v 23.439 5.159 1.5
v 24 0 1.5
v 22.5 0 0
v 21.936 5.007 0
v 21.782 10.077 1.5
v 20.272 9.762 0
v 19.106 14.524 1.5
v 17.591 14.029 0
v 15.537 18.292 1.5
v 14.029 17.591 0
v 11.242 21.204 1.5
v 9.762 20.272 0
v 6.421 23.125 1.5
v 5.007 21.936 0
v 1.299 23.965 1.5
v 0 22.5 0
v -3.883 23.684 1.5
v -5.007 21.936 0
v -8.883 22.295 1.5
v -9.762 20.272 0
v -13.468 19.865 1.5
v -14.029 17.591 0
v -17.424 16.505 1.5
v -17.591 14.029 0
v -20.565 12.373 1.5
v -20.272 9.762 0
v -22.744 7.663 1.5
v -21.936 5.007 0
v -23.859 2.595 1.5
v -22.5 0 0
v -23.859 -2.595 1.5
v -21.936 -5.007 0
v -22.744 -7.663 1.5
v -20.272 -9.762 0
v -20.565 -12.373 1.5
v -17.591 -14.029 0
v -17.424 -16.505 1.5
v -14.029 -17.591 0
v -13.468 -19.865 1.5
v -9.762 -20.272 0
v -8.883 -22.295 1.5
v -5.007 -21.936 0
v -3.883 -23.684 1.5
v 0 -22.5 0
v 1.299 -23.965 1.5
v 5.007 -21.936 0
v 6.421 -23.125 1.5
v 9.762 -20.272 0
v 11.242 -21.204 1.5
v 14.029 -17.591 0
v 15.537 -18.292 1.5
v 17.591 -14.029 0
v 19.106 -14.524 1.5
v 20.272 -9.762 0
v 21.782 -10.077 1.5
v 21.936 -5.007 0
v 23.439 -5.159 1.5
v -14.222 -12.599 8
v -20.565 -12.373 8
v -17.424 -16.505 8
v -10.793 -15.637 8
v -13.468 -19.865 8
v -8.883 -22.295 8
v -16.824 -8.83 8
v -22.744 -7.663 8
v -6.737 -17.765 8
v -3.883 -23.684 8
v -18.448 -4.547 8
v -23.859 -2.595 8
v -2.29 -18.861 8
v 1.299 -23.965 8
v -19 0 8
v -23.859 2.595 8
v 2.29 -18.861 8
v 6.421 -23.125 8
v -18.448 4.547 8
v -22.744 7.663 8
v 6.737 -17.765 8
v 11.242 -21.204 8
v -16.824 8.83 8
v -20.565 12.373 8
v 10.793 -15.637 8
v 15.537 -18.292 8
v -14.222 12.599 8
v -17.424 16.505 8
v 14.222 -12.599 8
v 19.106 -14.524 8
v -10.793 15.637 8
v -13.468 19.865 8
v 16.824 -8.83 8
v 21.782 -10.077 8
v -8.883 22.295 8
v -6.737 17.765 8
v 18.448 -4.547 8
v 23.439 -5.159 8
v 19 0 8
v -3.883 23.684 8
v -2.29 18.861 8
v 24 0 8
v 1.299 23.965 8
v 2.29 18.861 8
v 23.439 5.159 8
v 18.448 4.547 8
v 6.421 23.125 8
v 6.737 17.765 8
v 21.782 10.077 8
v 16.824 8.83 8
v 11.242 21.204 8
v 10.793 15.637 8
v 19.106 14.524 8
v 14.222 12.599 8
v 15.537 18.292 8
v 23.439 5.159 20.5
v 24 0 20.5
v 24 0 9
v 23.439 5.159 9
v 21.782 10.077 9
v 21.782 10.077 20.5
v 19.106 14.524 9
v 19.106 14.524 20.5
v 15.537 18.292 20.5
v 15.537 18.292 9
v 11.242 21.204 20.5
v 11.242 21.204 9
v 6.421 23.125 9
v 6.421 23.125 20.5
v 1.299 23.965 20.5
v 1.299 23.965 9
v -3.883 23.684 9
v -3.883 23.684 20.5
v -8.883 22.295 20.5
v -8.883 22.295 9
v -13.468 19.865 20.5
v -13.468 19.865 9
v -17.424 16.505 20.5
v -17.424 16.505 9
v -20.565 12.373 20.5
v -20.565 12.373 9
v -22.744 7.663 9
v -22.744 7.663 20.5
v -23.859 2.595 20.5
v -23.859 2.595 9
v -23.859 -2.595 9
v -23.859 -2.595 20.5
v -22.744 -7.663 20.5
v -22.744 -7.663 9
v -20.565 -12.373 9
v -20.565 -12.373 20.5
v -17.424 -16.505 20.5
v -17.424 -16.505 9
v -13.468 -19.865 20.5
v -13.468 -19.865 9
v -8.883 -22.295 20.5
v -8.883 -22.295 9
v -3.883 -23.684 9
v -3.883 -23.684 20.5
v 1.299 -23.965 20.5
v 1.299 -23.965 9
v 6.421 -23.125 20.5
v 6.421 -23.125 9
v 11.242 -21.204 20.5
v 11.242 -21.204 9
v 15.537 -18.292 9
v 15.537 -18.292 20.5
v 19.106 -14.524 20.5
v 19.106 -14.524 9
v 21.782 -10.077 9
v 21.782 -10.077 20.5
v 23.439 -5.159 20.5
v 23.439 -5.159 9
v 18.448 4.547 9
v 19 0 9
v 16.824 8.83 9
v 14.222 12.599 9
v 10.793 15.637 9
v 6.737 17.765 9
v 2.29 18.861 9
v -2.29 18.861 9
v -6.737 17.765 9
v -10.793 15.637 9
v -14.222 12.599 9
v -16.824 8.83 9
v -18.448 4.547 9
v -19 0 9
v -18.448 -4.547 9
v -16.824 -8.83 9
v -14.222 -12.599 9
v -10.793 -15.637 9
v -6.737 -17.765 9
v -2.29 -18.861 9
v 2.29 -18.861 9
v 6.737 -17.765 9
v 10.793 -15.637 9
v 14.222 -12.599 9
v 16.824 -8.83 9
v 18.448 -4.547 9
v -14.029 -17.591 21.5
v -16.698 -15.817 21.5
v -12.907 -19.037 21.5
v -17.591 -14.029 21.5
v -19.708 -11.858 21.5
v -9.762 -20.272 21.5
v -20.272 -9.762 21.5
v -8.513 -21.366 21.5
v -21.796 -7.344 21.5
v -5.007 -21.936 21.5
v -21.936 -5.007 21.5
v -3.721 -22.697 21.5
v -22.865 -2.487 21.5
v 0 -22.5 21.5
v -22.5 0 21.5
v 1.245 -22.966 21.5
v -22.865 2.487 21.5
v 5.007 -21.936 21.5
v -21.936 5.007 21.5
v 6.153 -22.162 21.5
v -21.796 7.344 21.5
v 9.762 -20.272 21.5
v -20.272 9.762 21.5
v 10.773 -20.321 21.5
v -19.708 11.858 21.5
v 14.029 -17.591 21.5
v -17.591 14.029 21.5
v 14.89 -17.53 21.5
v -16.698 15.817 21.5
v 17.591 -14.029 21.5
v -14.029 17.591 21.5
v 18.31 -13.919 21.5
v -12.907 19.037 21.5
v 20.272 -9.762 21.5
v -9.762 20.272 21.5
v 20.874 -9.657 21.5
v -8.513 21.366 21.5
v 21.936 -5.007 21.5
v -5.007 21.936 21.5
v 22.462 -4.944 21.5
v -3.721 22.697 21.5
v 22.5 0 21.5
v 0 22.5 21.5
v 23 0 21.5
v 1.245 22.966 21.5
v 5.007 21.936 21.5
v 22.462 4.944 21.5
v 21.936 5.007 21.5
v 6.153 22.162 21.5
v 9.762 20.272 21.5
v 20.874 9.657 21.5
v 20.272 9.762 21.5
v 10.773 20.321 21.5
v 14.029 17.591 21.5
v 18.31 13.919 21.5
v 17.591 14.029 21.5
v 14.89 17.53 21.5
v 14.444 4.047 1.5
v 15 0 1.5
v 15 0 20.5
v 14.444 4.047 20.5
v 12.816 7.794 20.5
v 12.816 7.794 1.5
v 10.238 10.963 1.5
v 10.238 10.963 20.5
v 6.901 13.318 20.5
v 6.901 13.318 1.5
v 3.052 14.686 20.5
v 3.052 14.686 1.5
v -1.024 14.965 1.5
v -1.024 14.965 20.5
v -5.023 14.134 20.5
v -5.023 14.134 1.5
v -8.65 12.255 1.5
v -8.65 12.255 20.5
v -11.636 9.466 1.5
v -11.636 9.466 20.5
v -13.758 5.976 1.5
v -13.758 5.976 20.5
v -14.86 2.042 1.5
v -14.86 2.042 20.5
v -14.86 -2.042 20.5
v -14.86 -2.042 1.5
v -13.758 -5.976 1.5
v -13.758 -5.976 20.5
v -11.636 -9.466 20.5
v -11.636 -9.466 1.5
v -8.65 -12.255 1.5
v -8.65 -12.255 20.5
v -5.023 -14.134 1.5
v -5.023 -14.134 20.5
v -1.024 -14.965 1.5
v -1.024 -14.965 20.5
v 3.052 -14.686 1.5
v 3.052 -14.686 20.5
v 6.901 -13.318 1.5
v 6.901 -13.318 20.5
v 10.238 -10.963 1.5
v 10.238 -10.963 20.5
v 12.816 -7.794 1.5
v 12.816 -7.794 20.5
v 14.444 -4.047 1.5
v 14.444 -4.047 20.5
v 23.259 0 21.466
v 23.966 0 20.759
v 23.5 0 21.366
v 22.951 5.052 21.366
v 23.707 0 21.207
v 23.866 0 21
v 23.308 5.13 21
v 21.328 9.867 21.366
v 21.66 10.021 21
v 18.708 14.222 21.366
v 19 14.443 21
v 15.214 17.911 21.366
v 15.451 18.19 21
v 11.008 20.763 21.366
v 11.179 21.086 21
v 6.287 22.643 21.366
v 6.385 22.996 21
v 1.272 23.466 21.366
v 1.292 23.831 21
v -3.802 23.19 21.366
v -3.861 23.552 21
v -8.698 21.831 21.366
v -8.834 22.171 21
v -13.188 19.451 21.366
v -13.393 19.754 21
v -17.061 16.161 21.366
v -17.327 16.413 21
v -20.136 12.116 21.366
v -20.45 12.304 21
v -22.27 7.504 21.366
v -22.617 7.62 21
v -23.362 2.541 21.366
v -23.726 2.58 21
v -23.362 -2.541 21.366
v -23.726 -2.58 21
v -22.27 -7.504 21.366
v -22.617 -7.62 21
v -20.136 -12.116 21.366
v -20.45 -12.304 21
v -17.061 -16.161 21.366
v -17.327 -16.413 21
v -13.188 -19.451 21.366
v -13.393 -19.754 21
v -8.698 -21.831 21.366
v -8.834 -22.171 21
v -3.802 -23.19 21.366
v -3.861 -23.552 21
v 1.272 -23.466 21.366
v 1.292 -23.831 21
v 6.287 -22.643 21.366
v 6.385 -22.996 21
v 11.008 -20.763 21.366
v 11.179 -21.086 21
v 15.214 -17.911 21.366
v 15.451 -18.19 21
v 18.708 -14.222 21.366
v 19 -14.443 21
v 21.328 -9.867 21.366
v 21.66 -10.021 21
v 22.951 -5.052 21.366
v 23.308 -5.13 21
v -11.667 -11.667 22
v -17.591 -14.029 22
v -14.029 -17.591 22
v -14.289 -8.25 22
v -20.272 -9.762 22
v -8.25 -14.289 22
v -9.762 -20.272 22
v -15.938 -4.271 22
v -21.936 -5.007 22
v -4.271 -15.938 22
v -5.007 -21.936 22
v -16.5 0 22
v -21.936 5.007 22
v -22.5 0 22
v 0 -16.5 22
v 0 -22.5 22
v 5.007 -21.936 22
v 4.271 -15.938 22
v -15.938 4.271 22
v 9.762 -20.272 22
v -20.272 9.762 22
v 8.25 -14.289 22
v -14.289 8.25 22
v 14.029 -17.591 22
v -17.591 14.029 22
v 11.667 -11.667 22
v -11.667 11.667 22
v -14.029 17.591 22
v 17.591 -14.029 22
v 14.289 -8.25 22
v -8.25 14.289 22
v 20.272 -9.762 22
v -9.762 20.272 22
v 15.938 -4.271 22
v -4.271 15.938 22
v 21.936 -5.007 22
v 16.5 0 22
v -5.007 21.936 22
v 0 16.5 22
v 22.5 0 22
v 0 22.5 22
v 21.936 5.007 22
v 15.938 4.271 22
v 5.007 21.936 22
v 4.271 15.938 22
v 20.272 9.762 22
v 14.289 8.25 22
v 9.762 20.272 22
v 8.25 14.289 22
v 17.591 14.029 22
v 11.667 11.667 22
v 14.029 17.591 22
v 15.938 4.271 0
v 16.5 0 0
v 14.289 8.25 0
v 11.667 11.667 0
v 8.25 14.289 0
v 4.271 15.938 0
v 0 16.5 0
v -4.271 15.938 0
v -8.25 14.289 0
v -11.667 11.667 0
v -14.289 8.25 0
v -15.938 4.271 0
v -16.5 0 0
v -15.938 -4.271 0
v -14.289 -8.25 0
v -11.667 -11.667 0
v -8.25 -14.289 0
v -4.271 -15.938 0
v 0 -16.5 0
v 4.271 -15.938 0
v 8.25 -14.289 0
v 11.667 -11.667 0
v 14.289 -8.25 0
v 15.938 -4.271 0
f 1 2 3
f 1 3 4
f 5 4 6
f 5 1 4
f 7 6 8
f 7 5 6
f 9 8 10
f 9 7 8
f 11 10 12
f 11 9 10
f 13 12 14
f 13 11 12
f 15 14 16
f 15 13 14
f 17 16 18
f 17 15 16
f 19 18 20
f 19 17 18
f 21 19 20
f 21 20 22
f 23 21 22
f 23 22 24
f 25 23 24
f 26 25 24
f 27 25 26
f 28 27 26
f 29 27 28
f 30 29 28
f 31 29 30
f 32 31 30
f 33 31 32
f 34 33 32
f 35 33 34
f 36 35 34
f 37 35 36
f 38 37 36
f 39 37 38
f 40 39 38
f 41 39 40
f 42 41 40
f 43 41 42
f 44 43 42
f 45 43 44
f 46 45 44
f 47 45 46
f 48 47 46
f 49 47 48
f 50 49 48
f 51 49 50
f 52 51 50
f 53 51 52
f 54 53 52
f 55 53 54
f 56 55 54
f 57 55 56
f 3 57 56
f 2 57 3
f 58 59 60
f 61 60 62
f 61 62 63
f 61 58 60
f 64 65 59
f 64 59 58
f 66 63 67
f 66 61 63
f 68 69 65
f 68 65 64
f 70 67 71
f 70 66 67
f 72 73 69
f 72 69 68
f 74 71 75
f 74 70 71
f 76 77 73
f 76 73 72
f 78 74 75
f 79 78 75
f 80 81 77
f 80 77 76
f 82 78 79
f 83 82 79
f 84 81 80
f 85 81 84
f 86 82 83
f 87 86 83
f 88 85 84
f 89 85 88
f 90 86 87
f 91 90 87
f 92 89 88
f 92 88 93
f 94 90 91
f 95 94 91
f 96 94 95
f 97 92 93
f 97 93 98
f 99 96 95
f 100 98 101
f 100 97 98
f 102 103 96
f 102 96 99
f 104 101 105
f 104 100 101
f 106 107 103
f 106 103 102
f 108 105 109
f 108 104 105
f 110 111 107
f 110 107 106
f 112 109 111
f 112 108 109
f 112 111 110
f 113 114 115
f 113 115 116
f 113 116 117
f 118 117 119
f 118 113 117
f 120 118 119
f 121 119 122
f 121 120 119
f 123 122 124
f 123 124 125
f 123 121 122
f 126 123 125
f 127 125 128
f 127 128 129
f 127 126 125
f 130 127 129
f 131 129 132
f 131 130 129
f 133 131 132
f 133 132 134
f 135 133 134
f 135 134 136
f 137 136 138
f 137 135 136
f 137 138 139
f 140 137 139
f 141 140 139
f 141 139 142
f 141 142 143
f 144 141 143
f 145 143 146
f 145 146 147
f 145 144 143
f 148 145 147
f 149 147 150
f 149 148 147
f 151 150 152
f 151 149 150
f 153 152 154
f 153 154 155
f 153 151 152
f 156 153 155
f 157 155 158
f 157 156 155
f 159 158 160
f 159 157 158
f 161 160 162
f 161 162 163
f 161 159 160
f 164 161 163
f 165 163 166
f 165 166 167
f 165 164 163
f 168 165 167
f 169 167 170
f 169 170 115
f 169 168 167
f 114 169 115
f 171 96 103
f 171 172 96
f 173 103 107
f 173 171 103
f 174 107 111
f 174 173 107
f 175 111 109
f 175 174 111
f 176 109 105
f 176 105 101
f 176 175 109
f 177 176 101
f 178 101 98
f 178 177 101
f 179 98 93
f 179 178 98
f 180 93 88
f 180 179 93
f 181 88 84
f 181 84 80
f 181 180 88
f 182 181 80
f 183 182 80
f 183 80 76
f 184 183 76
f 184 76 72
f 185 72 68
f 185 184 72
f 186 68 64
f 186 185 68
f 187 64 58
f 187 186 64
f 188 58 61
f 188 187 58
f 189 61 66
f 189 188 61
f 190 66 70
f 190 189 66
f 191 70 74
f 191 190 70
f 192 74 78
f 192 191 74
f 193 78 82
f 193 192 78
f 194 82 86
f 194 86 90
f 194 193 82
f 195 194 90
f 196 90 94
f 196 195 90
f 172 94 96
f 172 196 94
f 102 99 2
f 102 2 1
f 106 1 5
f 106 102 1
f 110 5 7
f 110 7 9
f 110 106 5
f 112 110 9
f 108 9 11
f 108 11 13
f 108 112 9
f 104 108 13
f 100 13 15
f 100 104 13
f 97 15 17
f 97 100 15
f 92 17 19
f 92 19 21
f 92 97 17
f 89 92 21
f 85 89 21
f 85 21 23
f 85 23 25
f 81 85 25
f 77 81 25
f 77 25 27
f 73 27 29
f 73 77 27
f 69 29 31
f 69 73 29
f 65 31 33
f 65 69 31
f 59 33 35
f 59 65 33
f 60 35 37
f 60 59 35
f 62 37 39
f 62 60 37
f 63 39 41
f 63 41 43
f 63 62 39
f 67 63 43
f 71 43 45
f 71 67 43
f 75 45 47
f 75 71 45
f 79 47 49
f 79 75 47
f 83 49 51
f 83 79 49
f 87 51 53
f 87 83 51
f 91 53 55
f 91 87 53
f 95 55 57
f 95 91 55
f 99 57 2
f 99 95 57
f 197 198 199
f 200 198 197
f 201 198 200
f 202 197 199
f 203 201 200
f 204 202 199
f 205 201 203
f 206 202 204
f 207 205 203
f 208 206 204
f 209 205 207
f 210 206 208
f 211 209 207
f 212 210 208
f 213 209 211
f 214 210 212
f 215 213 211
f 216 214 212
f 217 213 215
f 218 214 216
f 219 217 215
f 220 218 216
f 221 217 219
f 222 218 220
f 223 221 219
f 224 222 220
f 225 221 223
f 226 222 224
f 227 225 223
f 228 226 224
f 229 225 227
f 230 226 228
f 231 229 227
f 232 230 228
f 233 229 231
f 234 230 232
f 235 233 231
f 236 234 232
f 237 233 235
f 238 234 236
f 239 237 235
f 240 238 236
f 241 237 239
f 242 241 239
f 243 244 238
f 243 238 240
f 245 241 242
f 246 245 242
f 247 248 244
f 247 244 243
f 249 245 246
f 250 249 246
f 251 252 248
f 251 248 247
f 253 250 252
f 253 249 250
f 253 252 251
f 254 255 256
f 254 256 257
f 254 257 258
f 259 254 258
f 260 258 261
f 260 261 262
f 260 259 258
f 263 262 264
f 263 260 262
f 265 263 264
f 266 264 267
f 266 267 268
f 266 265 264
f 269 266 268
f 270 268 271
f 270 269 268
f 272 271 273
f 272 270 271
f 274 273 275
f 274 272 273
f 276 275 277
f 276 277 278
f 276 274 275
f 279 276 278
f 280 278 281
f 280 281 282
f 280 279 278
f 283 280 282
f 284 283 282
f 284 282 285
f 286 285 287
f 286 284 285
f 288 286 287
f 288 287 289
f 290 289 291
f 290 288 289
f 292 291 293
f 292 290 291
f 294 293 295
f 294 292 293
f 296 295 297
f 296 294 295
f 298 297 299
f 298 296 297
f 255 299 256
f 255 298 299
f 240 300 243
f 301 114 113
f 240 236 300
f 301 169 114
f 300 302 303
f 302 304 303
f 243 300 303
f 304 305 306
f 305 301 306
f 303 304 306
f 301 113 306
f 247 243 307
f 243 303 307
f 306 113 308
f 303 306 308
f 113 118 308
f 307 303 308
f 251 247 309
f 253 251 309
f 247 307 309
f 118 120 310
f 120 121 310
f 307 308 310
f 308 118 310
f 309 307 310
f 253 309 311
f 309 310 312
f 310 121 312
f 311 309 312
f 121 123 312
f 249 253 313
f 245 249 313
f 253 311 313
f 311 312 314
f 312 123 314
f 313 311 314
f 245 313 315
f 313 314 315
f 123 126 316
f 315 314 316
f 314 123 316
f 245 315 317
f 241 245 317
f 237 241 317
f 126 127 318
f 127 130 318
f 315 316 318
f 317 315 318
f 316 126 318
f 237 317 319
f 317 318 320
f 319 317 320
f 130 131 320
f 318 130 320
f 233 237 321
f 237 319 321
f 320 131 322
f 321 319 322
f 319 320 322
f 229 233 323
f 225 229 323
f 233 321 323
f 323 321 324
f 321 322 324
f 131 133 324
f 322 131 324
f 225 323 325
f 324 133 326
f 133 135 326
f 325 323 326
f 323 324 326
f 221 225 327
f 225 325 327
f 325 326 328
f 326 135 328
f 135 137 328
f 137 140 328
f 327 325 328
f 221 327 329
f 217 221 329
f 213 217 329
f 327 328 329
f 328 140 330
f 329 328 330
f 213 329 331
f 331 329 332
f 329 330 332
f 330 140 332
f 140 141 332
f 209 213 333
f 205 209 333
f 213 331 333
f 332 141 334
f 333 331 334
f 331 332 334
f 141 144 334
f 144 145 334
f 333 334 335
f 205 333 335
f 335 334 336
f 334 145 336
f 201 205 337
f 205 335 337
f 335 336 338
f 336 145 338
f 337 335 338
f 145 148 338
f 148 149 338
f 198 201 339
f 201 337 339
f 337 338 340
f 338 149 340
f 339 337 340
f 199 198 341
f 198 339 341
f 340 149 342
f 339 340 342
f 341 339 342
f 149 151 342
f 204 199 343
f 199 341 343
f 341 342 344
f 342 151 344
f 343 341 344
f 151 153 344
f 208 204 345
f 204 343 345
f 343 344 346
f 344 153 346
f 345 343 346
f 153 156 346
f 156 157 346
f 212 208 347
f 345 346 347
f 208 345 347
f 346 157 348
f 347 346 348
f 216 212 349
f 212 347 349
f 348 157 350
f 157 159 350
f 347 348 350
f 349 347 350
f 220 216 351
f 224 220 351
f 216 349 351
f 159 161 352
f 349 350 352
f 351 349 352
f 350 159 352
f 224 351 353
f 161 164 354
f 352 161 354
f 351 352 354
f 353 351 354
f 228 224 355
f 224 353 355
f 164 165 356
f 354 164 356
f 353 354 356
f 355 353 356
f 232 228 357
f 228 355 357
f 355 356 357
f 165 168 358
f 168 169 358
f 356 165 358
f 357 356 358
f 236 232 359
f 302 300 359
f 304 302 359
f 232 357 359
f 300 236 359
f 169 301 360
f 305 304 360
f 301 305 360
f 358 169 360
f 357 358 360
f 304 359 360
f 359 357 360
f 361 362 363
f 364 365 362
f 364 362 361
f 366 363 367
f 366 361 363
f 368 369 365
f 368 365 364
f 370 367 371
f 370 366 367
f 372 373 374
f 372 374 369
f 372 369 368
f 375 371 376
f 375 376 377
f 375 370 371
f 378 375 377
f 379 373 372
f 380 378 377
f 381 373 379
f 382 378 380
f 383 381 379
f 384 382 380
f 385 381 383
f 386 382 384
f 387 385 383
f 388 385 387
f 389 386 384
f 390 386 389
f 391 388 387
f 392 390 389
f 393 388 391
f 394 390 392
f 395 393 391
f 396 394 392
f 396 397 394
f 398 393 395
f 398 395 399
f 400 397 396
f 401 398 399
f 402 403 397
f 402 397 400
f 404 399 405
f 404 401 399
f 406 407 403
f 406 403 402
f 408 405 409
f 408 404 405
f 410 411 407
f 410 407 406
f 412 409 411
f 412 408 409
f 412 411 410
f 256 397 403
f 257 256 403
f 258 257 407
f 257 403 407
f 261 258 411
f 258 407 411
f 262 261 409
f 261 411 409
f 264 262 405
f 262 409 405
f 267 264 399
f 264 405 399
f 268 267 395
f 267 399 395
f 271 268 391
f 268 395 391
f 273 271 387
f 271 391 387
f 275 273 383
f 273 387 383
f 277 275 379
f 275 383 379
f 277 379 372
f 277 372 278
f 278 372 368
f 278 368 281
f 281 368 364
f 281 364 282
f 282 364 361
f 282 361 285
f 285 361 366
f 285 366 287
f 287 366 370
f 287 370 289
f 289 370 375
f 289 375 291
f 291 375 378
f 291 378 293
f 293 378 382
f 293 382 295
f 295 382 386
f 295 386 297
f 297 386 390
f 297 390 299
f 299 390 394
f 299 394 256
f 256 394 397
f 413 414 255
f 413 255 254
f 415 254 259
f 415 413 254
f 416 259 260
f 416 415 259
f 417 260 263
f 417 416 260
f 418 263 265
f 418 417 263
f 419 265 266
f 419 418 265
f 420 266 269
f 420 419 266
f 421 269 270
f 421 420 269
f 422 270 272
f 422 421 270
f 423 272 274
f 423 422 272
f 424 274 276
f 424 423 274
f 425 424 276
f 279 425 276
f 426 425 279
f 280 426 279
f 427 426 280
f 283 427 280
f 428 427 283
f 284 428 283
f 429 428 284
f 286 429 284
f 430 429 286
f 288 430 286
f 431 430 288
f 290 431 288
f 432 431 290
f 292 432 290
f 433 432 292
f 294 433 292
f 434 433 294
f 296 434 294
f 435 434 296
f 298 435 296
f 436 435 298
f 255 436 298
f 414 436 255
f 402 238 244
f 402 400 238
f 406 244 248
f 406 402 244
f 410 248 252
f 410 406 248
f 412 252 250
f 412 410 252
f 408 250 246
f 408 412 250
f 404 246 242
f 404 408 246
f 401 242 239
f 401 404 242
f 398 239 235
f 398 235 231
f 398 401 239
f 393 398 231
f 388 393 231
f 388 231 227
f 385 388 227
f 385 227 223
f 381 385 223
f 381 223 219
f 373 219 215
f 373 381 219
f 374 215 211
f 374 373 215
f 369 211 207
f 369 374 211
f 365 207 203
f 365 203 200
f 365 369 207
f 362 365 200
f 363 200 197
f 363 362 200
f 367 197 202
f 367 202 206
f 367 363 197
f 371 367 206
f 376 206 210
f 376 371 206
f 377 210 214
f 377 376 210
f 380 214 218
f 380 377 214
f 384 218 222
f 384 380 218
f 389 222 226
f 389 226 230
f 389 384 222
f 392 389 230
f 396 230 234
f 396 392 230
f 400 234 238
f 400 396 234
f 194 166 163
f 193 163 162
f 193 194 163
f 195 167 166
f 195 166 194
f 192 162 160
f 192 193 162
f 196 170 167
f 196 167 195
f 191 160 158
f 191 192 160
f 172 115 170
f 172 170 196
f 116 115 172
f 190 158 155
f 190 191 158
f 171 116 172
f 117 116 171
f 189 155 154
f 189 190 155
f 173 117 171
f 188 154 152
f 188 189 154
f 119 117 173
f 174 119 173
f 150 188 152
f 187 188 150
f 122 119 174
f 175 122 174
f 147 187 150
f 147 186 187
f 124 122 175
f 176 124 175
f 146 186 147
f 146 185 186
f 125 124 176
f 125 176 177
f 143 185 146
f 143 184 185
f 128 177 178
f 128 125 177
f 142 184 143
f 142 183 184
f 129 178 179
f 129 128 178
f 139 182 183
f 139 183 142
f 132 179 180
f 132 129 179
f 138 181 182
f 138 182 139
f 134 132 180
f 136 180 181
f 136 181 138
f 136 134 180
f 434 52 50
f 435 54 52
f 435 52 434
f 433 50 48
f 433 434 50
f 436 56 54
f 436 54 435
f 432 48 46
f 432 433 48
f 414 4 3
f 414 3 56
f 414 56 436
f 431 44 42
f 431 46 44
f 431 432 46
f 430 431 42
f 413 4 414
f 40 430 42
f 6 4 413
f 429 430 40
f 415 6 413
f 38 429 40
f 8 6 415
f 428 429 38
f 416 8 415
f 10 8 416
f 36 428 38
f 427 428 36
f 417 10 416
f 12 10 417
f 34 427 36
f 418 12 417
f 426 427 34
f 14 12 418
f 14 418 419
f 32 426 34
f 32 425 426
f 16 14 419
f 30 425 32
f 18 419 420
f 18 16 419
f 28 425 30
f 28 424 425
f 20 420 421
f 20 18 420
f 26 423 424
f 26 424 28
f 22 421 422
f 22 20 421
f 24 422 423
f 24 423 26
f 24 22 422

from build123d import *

# Parameters (mm, degrees)
F2_SIZE = 1.5
F3_R    = 1


with BuildPart() as f1:
    # F0 (on Front) → F1 (revolve)
    with BuildSketch(Plane.XZ):
        Polygon((15, 22), (15, 0), (24, 0), (24, 8), (19, 8), (19, 9), (24, 9), (24, 21.5), (22.5, 21.5), (22.5, 22), align=None)
    revolve(axis=Axis((0, 0, -3.522726), (0, 0, 1)))

    # F2
    f2_edges = [f1.edges().sort_by_distance(p)[0] for p in [
        (-24, 0, 0),
        (-15, 0, 0),
        (-15, 0, 22),
    ]]
    chamfer(f2_edges, length=F2_SIZE)

    # F3
    f3_edges = [f1.edges().sort_by_distance(p)[0] for p in [
        (-24, 0, 21.5),
    ]]
    fillet(f3_edges, radius=F3_R)


solid = f1.part
